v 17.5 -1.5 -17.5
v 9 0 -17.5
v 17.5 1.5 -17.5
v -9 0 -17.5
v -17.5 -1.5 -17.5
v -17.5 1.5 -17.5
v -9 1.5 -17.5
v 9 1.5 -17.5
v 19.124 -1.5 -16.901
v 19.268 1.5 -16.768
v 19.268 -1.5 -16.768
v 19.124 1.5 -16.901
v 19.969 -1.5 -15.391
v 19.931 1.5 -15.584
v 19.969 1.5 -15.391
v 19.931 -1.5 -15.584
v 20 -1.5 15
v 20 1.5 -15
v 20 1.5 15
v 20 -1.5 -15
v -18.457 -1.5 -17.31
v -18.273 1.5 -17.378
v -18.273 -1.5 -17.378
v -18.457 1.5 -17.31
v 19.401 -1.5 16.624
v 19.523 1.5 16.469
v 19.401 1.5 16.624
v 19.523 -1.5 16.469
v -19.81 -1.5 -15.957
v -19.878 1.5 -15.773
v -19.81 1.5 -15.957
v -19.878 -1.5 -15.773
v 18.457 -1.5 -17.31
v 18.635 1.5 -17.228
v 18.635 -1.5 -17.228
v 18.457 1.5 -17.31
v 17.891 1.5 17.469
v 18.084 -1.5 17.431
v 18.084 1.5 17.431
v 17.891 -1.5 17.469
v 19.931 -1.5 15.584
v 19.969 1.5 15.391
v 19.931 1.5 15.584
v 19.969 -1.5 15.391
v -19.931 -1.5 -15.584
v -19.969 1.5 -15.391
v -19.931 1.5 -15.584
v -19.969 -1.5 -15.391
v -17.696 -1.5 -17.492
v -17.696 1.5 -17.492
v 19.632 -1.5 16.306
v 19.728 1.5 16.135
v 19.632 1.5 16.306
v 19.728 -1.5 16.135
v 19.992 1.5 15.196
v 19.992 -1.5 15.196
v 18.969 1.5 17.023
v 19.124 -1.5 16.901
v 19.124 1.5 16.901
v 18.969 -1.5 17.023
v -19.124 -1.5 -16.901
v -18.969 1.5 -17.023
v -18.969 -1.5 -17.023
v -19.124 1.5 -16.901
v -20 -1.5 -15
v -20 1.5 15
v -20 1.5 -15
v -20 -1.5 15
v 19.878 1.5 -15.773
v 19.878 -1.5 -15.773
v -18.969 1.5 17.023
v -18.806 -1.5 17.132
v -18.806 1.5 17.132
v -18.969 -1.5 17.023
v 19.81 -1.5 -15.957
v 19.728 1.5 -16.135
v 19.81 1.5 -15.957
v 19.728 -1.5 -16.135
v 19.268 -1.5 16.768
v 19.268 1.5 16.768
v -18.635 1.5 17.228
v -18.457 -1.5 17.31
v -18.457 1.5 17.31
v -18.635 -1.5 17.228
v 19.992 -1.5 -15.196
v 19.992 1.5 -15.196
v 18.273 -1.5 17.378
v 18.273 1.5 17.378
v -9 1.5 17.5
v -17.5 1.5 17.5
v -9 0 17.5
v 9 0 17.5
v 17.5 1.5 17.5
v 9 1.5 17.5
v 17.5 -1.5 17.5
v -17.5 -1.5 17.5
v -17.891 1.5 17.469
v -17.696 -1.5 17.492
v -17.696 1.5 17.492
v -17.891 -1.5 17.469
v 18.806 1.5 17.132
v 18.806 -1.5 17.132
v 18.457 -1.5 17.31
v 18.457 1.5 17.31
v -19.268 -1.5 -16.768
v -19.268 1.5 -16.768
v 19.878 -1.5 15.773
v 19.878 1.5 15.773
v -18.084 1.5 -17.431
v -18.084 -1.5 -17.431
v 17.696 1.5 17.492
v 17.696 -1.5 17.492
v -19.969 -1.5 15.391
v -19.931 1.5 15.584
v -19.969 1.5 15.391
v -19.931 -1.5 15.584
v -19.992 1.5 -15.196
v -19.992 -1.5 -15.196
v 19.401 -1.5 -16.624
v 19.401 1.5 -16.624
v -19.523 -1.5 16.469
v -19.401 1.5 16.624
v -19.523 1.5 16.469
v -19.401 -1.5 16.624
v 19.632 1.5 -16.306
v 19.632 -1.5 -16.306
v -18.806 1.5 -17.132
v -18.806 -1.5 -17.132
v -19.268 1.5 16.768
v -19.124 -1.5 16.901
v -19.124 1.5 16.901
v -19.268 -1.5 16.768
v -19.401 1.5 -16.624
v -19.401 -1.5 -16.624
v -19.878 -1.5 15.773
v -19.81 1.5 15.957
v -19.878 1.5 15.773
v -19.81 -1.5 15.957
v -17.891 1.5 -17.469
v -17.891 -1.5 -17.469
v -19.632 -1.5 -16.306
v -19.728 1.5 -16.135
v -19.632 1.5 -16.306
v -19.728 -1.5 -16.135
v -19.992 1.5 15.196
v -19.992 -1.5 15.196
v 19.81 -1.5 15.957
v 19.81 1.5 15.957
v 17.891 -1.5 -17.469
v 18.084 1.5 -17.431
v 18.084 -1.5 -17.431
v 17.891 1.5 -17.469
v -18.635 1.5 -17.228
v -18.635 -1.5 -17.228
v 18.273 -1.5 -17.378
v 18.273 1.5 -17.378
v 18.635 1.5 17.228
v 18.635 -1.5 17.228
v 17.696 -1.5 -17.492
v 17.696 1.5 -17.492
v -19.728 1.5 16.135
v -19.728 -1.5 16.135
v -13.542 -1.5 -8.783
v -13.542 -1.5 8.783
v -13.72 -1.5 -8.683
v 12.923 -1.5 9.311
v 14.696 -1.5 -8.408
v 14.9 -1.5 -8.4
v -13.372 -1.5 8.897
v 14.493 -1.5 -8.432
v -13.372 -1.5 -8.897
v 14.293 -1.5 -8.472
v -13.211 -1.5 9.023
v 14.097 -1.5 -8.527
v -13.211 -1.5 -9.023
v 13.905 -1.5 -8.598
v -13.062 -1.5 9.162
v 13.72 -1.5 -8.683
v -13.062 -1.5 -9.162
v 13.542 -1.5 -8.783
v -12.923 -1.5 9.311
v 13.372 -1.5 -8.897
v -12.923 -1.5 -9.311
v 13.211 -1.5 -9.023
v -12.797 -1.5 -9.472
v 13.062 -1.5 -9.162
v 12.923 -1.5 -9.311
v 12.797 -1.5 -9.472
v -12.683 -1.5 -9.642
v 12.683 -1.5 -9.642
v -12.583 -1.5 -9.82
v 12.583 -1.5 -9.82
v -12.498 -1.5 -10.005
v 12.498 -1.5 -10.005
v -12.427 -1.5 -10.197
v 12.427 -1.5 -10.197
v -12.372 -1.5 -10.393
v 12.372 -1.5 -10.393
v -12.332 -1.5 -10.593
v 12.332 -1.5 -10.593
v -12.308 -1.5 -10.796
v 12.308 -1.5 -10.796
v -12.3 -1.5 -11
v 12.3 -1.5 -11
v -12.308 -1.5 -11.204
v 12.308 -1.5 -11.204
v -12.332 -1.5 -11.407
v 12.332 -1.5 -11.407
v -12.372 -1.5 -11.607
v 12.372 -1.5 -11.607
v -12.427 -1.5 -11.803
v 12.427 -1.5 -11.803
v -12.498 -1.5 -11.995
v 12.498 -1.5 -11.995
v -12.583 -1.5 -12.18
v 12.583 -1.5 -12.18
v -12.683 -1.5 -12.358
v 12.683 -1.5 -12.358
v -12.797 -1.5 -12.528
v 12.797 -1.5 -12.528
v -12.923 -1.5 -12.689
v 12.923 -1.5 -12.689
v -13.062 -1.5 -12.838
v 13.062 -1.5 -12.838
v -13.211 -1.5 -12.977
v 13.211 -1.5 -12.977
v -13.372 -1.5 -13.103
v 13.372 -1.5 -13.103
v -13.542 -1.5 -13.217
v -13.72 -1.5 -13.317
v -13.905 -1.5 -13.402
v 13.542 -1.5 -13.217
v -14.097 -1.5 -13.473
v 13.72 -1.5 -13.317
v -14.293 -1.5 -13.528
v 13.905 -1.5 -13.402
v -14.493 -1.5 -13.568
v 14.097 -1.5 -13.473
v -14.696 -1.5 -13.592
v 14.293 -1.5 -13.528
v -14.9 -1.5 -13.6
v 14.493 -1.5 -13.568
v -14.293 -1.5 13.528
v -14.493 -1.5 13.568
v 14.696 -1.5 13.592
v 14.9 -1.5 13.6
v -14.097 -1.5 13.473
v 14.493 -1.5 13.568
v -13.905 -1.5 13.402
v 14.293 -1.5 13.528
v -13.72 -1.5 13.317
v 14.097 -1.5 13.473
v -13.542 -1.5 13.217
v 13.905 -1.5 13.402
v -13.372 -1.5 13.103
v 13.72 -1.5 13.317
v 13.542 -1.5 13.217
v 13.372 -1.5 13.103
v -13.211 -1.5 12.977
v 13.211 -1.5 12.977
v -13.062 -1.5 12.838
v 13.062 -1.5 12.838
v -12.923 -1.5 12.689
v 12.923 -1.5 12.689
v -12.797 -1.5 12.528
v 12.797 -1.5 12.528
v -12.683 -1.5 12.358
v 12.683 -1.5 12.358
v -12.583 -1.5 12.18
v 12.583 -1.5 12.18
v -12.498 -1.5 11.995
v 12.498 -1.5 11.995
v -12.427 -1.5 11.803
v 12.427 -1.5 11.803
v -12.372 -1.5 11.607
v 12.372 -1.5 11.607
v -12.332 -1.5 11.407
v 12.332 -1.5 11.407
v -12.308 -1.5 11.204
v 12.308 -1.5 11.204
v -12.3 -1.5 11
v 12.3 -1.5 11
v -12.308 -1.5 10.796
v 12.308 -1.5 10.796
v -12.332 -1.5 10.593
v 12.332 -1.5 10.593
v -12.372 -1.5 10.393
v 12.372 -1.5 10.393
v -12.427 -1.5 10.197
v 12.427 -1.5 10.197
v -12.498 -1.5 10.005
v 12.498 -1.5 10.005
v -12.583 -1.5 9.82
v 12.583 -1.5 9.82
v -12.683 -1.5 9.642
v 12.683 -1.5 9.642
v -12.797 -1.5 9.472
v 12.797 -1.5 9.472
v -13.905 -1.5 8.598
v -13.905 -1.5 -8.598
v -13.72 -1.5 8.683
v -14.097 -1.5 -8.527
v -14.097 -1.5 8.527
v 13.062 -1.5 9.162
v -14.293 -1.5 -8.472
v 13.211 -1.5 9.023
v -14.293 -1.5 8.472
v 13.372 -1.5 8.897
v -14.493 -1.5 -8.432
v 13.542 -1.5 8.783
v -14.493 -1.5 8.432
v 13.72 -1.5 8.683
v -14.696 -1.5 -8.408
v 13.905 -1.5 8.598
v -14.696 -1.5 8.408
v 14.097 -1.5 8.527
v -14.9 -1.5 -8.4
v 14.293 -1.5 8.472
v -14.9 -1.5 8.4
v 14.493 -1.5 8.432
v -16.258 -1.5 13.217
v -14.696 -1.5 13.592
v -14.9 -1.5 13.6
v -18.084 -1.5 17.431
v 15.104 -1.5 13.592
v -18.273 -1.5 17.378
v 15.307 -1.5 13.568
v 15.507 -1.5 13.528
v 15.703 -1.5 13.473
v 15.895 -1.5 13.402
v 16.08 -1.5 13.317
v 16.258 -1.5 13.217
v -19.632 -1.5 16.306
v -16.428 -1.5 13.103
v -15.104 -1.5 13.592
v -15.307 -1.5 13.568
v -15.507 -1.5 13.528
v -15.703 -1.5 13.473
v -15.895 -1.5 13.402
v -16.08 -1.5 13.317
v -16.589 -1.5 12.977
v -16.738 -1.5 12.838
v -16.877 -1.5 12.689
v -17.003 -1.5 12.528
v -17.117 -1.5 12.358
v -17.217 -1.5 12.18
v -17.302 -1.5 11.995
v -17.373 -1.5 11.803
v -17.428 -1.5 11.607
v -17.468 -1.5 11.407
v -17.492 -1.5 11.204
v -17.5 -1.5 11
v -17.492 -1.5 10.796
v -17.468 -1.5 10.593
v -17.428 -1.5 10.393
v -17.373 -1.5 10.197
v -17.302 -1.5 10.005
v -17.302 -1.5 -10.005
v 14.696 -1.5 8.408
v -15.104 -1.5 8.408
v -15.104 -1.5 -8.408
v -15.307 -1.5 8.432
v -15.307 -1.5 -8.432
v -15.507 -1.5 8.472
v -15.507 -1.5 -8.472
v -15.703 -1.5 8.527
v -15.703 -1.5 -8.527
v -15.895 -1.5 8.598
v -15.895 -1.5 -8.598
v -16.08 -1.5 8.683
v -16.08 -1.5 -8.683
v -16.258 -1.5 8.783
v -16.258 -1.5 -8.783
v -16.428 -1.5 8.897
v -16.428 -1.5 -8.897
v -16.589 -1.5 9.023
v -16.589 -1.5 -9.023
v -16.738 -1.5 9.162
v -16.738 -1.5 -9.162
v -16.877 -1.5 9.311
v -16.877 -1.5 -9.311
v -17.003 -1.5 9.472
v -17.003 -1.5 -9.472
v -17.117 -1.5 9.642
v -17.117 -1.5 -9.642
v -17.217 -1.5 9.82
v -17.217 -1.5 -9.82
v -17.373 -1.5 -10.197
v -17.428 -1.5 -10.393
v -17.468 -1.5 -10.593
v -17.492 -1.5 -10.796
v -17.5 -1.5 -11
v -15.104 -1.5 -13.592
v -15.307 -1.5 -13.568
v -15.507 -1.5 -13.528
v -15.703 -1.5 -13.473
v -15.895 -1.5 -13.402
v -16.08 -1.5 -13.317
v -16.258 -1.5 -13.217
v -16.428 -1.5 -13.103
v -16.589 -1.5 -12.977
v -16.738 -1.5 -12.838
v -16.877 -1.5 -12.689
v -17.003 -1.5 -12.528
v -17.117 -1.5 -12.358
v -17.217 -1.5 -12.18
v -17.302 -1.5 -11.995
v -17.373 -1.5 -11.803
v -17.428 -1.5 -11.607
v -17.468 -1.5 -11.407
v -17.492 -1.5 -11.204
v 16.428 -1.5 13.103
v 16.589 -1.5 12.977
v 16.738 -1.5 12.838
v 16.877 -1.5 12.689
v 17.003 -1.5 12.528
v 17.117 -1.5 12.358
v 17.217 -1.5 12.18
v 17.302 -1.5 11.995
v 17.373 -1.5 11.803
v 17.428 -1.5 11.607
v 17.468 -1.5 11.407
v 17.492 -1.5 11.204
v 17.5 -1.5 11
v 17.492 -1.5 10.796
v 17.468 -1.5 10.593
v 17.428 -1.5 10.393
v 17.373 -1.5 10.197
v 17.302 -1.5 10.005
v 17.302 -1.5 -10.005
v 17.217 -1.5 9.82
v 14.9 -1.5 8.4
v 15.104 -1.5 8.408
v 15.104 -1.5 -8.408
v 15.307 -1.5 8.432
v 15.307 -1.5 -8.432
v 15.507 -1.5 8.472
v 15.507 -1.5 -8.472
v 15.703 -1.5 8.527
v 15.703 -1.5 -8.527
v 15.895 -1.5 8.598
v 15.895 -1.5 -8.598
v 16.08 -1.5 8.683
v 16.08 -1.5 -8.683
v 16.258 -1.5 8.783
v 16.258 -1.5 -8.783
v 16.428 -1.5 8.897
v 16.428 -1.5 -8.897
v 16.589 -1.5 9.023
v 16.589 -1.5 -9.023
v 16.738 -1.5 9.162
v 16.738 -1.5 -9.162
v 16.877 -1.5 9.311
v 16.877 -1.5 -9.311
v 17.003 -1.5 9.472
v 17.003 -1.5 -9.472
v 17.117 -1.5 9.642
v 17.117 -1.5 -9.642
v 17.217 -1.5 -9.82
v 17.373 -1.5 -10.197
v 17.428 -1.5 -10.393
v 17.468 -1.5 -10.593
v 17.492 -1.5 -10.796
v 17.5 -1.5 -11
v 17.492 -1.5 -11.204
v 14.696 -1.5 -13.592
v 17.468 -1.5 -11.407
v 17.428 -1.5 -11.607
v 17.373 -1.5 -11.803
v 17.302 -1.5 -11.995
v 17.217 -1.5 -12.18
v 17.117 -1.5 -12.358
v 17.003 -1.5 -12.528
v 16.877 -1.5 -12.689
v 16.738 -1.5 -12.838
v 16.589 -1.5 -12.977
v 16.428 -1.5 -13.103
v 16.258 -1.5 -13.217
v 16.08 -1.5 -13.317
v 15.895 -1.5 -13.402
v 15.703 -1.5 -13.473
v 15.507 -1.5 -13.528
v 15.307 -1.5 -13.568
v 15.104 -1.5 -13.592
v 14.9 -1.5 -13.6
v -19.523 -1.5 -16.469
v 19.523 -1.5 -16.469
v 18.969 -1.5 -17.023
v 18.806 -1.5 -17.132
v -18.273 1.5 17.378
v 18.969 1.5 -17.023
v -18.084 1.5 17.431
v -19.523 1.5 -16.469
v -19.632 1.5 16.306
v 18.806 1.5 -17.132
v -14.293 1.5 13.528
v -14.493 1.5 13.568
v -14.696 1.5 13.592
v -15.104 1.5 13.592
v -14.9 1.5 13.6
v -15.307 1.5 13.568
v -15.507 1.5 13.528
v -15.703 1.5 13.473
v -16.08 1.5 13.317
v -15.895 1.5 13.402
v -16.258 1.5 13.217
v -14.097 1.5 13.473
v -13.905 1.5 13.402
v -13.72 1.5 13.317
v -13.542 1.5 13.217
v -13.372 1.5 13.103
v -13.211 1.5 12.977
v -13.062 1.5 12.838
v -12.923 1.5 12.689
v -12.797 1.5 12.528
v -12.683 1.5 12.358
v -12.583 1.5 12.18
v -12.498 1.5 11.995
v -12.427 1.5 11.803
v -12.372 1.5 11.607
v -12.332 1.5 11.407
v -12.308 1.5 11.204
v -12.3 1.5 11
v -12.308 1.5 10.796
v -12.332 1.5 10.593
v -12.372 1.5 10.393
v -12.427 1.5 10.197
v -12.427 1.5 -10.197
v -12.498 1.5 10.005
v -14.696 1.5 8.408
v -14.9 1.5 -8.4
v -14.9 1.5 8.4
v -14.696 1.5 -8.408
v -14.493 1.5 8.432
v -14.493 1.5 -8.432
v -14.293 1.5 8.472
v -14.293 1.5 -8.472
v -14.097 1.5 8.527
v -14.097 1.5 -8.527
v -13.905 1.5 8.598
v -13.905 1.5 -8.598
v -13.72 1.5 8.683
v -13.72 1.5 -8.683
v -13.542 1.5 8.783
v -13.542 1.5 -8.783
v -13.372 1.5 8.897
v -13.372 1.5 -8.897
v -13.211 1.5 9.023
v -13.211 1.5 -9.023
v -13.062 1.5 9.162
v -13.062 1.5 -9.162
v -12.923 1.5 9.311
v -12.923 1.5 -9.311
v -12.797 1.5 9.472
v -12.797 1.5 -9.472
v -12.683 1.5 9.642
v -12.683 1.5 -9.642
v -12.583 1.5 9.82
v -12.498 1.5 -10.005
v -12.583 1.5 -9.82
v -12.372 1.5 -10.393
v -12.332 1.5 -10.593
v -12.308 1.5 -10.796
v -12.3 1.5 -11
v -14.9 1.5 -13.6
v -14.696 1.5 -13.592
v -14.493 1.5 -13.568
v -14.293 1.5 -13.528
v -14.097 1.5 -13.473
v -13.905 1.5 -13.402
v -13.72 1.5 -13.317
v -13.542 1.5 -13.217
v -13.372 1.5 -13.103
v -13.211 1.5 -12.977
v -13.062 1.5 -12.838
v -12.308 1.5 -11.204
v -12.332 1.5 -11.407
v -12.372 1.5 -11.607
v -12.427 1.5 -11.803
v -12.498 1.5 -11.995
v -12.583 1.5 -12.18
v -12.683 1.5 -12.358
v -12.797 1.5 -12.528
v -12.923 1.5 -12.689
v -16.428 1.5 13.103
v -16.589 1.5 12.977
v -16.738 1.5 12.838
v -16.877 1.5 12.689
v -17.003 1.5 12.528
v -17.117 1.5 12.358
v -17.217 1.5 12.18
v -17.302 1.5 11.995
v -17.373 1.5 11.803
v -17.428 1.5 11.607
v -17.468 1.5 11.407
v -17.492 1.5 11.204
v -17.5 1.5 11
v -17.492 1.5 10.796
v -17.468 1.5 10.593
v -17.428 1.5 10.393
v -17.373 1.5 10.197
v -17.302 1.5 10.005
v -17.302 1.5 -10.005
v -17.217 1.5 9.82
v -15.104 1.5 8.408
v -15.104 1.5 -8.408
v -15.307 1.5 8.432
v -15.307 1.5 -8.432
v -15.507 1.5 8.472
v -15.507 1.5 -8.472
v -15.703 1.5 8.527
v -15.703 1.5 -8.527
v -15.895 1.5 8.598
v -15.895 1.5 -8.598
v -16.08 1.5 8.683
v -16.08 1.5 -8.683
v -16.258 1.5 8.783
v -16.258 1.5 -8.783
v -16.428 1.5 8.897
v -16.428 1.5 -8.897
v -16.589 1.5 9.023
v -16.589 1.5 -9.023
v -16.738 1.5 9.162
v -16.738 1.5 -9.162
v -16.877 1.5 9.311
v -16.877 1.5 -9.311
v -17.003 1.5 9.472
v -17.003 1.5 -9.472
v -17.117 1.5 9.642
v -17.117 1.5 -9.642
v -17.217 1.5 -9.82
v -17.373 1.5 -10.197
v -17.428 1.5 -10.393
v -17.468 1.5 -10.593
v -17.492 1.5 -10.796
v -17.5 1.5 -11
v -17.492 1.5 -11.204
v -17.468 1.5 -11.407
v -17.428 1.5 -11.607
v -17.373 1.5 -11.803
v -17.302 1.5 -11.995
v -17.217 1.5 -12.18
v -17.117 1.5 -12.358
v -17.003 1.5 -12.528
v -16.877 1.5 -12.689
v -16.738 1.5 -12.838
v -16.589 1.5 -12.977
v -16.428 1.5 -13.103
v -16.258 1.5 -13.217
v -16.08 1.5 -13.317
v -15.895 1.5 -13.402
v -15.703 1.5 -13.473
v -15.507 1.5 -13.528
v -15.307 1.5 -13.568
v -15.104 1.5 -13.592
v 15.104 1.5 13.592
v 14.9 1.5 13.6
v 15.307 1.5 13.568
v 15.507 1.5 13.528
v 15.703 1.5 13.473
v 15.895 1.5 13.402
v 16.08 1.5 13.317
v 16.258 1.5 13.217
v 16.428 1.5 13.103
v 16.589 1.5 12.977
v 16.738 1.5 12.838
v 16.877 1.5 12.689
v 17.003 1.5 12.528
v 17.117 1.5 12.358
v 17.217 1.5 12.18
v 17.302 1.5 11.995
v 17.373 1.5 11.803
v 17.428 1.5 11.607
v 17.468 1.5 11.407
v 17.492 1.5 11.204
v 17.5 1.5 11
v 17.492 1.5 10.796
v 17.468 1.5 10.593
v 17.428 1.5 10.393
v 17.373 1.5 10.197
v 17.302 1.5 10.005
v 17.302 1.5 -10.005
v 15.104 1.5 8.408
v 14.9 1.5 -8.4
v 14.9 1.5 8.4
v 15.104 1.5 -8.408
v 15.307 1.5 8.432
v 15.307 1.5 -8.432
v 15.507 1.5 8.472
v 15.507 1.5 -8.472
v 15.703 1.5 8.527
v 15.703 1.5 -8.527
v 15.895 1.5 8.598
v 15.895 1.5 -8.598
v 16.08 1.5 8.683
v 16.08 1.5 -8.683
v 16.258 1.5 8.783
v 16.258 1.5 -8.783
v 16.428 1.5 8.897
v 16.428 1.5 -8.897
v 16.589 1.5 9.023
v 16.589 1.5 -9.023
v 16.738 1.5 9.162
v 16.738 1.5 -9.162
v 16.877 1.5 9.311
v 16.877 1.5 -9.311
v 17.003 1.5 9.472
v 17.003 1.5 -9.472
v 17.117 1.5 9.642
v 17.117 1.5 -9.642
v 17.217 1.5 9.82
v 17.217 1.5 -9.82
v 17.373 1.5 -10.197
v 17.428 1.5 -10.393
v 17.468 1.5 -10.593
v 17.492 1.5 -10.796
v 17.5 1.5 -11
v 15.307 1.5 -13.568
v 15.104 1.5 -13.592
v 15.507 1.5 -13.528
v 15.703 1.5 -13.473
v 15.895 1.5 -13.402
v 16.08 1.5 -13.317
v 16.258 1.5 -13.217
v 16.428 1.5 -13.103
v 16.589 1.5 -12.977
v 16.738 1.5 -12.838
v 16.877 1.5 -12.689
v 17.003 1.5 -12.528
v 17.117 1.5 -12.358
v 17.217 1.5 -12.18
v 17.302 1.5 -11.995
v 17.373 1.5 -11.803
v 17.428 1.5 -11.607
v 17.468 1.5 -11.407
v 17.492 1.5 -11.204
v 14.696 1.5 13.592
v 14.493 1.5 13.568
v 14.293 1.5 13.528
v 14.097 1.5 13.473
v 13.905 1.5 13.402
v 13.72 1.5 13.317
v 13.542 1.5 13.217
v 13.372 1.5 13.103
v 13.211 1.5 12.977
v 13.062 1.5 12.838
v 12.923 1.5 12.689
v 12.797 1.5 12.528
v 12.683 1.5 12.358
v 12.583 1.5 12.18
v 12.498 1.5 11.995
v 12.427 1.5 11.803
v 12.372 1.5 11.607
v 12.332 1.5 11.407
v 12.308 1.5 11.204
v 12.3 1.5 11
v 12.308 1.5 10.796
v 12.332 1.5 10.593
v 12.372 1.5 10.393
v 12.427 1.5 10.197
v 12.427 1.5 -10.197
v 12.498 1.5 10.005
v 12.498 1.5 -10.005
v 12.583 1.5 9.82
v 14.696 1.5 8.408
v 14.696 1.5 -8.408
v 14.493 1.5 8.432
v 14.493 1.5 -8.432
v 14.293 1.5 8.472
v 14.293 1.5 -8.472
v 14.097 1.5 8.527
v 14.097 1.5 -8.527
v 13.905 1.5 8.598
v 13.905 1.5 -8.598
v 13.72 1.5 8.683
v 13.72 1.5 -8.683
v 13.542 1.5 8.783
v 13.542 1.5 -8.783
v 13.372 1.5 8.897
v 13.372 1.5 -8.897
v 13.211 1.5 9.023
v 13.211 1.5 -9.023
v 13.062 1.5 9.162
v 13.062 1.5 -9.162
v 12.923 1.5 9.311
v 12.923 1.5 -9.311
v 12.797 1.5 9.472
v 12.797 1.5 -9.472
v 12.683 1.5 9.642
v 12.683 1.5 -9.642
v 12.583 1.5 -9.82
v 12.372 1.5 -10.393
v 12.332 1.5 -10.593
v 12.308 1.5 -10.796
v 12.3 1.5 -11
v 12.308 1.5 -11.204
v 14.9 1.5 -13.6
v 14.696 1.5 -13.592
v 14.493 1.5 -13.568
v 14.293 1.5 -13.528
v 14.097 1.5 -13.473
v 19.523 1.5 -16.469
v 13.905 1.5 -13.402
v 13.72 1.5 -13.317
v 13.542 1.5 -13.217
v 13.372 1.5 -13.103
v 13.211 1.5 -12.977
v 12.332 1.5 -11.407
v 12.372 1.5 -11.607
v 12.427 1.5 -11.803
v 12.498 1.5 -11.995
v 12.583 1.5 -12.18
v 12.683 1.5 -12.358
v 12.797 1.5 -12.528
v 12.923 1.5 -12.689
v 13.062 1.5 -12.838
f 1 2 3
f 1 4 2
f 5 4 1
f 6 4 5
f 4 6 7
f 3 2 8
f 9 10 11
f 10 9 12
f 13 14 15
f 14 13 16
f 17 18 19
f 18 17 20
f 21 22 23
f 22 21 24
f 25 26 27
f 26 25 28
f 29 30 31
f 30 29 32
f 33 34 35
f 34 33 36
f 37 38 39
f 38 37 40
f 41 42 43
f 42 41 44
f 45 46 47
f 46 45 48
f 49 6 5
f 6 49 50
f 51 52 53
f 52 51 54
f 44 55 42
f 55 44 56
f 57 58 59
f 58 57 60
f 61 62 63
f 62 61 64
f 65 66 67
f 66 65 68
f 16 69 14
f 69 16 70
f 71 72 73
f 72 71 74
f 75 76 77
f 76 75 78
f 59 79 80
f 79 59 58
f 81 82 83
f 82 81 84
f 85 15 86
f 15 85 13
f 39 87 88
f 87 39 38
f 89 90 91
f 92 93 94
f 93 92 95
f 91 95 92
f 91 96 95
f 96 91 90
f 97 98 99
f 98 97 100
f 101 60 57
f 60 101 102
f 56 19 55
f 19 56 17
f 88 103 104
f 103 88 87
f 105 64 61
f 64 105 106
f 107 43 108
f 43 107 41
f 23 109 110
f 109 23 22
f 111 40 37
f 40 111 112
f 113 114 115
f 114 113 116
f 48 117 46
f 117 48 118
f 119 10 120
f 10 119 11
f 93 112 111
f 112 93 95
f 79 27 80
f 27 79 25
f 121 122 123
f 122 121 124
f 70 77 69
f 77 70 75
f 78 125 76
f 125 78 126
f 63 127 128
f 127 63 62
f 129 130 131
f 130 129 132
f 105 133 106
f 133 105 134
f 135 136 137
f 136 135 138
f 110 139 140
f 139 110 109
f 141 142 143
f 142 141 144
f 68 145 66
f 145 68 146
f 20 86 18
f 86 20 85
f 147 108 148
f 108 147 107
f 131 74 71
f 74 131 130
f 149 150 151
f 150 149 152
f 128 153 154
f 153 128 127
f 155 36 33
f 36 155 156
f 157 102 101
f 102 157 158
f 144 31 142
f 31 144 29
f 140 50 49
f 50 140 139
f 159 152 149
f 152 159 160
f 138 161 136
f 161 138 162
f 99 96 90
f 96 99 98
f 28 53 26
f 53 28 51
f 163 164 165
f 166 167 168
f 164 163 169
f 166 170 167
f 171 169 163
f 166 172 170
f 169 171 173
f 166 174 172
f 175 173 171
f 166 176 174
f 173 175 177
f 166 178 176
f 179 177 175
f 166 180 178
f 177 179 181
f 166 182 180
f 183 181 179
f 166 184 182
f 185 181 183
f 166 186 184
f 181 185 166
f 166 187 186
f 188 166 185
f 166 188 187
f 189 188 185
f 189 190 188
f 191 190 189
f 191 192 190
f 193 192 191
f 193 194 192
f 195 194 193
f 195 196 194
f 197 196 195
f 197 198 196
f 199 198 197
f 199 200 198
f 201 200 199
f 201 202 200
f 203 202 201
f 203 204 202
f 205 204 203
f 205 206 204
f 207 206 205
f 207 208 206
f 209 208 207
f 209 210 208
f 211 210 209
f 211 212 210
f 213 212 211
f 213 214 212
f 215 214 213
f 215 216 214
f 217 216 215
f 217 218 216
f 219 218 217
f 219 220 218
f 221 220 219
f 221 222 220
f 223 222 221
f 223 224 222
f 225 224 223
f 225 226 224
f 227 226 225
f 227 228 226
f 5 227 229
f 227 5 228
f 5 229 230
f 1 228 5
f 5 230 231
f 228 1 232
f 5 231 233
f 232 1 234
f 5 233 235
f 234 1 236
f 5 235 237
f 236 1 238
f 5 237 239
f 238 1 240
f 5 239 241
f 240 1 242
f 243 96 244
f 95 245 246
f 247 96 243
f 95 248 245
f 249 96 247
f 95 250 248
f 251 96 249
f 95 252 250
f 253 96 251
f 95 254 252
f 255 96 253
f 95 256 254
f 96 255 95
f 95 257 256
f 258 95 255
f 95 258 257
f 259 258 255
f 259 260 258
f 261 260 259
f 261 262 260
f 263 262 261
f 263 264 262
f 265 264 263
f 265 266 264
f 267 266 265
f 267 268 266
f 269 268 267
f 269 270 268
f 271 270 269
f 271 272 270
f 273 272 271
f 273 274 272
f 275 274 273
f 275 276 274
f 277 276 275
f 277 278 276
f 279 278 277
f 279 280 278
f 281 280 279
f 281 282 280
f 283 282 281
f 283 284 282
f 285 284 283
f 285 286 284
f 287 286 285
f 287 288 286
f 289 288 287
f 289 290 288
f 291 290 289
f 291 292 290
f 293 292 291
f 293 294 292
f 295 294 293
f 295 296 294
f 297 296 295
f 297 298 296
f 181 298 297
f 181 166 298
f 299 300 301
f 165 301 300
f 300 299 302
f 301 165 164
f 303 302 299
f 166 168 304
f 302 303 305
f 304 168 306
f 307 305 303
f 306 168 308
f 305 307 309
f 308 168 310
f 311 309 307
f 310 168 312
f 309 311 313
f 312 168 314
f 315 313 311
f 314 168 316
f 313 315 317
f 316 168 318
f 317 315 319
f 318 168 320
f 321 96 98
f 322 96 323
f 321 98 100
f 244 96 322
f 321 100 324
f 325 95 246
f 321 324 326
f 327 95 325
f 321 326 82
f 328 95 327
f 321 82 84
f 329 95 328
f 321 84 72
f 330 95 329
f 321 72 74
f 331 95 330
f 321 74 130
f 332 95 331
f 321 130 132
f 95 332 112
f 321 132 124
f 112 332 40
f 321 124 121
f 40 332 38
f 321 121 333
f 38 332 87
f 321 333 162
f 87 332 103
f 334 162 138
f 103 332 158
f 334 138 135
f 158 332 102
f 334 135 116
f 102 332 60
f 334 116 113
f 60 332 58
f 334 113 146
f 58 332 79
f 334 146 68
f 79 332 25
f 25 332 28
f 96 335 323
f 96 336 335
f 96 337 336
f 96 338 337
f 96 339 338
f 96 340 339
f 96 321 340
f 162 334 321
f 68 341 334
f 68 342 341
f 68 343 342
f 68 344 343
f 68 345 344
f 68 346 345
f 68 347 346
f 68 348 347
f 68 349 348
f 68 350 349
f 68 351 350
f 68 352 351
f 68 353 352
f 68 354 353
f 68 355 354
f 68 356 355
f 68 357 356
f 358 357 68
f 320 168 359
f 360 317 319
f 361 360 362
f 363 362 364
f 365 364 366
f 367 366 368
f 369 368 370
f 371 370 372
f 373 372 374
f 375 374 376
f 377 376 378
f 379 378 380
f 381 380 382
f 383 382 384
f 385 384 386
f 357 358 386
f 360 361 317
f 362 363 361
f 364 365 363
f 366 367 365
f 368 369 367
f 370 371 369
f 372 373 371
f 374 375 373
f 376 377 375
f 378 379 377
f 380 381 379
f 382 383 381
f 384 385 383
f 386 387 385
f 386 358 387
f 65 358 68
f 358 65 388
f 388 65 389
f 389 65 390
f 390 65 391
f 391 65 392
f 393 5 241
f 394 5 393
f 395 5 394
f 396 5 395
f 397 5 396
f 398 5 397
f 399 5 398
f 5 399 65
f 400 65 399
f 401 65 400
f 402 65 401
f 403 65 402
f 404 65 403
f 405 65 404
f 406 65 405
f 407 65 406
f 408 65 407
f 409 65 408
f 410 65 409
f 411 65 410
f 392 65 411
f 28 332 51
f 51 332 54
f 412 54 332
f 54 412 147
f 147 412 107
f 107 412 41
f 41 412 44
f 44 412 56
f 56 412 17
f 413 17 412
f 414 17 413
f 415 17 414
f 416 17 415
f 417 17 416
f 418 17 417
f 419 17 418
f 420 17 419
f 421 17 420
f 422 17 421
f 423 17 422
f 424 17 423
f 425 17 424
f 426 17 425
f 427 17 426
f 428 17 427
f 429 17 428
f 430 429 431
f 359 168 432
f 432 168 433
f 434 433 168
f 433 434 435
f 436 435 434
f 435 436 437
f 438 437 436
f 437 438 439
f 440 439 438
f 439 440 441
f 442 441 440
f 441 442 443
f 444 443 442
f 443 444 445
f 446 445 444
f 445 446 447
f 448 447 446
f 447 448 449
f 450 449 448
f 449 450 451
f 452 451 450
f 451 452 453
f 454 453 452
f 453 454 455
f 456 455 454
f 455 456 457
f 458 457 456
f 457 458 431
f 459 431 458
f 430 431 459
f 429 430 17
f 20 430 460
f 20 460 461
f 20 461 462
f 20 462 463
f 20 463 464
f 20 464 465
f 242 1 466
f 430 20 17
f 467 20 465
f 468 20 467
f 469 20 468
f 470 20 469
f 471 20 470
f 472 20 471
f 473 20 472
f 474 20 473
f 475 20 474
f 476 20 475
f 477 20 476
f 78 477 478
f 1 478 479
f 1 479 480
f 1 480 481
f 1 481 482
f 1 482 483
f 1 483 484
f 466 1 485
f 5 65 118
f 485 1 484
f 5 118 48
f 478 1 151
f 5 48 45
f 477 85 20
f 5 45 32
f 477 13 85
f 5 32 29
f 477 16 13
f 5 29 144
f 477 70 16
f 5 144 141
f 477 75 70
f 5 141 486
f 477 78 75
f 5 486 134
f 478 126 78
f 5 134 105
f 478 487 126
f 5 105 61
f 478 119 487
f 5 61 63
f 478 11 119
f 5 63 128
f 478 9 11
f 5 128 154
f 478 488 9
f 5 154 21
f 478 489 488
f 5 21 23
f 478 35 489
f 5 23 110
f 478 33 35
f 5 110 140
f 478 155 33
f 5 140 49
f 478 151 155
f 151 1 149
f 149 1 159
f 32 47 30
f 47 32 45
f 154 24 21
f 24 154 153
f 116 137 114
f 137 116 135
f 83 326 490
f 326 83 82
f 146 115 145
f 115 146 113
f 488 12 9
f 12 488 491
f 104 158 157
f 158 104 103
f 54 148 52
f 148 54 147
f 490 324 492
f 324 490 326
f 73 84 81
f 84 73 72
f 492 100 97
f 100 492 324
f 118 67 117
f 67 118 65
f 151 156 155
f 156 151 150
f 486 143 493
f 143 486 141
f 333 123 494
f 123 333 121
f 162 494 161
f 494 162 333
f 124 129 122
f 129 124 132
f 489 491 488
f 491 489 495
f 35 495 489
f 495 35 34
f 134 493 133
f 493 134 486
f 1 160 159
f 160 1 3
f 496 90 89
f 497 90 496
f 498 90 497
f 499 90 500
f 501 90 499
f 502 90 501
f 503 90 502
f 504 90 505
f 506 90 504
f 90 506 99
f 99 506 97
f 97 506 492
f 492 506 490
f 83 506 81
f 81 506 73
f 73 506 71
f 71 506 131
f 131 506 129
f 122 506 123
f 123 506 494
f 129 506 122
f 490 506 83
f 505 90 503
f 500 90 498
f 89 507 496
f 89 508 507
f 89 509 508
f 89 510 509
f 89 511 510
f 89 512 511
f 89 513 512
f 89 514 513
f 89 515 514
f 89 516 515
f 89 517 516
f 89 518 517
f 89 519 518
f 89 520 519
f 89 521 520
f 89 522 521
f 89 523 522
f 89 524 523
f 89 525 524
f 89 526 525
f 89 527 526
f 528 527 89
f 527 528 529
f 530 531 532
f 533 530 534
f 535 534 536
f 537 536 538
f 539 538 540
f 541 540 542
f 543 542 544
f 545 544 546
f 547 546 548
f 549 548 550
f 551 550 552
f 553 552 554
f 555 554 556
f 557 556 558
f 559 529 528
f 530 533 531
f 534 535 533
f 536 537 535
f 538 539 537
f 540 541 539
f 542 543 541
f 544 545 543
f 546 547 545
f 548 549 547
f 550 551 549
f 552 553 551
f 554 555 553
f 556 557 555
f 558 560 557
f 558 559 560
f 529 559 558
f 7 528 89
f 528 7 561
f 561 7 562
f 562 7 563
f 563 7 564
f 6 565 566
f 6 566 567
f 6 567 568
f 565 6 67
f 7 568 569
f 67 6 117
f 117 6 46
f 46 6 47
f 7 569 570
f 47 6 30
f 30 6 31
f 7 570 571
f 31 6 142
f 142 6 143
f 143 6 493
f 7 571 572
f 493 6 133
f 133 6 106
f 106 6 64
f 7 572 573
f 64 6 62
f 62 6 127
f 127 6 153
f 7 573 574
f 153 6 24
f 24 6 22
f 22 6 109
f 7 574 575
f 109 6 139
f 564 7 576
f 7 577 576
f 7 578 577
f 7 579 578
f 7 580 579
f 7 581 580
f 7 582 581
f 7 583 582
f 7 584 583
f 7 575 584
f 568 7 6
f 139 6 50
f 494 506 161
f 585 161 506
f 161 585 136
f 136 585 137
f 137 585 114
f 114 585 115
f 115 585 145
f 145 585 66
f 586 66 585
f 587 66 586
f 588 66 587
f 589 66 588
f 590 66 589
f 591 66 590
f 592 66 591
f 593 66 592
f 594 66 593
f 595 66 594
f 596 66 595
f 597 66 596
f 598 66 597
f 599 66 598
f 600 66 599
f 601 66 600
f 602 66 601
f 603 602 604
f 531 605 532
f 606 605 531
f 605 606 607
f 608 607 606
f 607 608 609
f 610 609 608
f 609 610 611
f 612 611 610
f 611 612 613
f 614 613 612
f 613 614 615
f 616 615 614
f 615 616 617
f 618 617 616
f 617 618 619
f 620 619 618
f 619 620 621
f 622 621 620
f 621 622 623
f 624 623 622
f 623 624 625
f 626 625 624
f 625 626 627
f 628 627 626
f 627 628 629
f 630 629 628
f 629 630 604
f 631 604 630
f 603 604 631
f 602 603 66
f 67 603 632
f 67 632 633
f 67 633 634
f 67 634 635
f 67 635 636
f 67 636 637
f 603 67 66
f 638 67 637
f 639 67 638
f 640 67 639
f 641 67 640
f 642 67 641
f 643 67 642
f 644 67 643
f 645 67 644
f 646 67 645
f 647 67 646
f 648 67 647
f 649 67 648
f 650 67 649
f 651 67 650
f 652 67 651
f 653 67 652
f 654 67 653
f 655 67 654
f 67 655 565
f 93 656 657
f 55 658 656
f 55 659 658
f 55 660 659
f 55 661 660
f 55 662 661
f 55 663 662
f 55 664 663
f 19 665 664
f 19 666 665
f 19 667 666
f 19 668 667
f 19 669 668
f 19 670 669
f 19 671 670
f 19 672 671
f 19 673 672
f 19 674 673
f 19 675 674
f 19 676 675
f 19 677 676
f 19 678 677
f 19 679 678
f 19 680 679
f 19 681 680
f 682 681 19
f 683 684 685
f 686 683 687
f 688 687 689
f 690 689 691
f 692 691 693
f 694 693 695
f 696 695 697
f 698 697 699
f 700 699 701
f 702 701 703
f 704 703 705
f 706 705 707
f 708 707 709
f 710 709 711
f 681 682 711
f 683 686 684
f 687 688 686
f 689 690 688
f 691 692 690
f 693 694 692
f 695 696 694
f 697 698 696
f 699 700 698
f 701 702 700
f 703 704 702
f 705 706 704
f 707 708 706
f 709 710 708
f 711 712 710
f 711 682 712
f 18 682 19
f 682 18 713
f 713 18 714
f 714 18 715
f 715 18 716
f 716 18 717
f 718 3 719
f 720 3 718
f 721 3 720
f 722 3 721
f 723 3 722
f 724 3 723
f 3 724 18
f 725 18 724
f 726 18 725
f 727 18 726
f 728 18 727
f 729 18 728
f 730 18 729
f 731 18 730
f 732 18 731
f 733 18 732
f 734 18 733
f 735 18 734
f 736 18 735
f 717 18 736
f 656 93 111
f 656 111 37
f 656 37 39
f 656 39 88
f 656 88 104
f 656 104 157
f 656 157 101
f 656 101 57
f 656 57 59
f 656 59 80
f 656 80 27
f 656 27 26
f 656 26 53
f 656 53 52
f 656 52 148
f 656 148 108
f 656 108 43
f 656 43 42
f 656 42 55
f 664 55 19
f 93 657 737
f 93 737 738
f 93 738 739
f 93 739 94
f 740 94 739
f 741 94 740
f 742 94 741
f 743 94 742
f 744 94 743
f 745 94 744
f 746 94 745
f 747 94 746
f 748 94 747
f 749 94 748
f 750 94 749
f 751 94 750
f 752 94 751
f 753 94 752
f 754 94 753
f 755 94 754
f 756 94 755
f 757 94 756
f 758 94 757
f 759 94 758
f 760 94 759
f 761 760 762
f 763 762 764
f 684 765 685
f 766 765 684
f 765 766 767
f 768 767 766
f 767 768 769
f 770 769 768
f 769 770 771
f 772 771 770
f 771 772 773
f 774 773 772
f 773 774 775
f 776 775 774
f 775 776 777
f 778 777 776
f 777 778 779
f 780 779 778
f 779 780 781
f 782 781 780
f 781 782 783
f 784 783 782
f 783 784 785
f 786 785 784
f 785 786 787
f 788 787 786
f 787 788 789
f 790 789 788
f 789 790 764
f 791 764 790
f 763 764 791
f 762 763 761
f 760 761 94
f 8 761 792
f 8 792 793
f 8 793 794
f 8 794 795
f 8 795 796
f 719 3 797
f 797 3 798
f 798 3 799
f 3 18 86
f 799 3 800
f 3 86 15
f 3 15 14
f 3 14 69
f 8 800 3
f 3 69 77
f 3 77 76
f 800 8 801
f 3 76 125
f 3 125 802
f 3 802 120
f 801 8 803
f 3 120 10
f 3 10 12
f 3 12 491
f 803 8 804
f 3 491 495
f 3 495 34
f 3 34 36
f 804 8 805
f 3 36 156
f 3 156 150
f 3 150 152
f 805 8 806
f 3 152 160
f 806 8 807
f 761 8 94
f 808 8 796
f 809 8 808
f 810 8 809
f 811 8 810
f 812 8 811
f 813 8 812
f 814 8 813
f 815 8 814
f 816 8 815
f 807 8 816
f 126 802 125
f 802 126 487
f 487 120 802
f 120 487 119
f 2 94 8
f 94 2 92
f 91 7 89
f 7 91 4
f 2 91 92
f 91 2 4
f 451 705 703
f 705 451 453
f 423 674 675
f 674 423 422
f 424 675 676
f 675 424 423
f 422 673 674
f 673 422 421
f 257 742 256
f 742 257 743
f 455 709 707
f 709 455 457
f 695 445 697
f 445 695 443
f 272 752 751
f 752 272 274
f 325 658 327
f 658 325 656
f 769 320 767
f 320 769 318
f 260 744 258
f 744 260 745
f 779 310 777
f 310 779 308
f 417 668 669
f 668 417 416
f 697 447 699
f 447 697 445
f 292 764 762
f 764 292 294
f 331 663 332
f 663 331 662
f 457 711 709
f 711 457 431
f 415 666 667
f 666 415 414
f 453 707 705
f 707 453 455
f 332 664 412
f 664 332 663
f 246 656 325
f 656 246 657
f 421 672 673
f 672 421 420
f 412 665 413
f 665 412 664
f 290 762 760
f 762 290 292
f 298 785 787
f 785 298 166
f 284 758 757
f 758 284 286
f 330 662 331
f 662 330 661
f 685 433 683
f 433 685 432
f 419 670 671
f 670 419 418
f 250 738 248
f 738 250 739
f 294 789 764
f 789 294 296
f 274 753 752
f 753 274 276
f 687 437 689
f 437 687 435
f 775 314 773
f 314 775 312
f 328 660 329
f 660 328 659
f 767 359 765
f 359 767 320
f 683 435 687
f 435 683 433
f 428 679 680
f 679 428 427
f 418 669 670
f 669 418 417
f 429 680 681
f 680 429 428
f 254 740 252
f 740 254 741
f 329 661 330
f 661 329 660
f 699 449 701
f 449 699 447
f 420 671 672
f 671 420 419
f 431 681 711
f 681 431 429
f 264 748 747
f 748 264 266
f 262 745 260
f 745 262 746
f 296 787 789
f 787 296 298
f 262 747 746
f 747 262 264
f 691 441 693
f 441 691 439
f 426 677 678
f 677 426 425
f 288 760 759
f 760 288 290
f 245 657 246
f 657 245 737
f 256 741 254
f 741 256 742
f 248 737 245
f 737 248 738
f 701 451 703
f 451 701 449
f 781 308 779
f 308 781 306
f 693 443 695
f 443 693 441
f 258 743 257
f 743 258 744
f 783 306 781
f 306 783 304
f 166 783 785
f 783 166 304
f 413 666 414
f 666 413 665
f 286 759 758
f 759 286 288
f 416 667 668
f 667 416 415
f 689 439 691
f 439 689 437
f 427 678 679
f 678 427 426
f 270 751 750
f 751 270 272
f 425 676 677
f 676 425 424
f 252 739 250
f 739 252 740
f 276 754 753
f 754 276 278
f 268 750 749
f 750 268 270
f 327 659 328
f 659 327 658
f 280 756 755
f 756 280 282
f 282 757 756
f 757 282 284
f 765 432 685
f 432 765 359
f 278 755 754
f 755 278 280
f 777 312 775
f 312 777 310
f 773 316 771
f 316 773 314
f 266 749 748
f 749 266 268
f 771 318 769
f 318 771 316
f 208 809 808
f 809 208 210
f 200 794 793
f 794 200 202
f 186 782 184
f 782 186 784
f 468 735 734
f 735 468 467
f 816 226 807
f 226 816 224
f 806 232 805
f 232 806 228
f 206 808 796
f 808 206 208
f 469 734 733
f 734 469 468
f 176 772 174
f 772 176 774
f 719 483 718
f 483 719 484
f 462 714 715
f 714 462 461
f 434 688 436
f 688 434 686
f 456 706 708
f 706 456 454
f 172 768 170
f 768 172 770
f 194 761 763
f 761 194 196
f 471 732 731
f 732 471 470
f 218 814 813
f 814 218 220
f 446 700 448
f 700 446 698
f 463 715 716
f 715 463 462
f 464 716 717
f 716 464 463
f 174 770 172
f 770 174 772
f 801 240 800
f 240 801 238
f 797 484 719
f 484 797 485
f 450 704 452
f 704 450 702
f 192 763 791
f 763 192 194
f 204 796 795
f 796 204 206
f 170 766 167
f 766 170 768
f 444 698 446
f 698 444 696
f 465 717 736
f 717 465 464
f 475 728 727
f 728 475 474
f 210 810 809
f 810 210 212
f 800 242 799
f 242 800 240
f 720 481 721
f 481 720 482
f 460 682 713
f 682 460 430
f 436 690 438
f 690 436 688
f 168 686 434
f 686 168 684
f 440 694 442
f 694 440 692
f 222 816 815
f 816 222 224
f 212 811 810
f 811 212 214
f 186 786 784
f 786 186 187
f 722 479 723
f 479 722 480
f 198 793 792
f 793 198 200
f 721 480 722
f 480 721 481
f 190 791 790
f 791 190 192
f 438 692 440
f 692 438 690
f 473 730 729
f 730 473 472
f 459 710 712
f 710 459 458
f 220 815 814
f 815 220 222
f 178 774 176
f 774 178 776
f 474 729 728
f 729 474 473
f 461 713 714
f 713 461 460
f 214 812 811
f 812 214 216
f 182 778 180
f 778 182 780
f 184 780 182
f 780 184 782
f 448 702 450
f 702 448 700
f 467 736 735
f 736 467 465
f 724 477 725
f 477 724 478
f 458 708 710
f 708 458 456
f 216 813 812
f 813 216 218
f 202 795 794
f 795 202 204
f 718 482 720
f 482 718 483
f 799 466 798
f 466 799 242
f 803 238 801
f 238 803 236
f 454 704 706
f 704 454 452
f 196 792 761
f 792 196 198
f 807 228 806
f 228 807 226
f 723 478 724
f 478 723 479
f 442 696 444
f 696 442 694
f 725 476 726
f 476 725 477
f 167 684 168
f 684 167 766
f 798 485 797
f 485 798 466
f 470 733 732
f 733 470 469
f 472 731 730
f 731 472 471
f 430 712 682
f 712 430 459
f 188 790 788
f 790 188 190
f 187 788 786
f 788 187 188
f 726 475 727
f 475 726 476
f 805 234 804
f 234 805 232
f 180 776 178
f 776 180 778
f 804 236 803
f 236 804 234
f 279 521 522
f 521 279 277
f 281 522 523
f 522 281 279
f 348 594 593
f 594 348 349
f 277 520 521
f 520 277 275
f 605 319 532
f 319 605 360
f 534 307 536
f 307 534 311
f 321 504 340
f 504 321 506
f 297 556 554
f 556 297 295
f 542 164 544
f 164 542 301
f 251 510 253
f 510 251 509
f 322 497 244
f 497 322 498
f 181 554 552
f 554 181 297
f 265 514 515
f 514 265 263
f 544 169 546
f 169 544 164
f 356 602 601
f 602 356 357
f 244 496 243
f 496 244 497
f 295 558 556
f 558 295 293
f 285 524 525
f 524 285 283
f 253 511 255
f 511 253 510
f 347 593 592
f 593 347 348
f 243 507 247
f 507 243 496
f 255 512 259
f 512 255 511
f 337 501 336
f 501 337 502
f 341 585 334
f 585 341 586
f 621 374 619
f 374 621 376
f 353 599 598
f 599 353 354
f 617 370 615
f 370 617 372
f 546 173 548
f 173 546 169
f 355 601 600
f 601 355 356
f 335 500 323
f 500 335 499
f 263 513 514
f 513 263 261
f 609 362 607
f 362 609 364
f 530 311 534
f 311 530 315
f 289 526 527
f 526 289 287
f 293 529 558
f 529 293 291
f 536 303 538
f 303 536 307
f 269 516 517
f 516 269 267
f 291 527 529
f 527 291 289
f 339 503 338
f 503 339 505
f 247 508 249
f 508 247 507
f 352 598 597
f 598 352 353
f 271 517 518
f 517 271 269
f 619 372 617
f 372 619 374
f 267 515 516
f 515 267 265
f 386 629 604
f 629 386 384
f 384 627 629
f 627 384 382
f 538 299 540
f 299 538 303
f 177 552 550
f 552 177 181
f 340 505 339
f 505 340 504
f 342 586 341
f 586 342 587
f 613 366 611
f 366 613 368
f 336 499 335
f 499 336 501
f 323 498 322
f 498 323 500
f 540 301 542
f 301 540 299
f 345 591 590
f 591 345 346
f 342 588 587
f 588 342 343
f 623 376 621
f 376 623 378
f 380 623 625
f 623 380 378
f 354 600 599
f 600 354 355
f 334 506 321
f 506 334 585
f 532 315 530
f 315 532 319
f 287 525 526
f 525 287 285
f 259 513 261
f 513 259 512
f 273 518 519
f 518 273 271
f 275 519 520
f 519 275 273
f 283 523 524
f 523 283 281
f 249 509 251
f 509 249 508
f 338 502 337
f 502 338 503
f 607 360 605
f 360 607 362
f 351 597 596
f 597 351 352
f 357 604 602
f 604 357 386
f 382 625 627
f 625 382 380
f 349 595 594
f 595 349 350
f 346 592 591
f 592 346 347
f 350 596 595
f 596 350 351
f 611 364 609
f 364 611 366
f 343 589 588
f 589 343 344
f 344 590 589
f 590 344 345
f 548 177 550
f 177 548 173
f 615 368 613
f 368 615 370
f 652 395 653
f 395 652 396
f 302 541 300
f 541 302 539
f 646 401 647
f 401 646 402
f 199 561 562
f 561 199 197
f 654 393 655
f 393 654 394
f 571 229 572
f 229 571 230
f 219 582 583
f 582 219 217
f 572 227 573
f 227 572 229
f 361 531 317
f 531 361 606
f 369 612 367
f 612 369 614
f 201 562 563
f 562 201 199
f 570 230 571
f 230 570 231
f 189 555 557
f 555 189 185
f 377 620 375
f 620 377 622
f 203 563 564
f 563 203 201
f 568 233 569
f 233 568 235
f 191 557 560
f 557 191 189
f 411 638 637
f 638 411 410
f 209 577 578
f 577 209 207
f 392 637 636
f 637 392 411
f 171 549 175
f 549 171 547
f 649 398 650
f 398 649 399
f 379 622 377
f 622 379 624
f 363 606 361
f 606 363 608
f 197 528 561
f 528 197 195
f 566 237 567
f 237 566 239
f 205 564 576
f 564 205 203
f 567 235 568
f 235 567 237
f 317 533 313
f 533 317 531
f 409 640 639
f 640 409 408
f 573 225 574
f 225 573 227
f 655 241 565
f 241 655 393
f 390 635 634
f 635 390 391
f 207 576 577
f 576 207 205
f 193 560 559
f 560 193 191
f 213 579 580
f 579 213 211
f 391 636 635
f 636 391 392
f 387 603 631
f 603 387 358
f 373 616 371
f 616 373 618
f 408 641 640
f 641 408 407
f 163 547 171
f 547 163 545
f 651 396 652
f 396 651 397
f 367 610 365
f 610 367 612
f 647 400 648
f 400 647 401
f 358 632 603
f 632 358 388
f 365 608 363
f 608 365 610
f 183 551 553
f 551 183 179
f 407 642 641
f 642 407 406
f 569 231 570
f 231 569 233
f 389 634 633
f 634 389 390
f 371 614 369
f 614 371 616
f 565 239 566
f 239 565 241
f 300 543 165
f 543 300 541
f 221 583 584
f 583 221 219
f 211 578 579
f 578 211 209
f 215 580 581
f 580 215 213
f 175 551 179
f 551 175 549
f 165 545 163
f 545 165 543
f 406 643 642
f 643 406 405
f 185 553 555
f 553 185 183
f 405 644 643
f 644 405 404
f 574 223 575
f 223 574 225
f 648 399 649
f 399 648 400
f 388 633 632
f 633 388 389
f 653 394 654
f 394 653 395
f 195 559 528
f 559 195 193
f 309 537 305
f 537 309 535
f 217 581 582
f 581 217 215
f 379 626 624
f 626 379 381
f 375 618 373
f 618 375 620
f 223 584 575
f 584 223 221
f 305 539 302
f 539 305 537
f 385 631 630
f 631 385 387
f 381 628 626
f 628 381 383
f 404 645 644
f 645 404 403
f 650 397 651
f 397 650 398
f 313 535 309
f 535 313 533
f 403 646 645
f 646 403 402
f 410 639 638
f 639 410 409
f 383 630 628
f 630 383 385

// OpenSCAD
$fn=80;
power();
module power(){
    //cube([18,3,25],center=true); 
    
    difference(){
        minkowski(){
            cube([35,1.5,30],center=true);
            rotate([90,0,0]) cylinder(d=5,h=1.5,center=true);
            //cylinder(d=5,h=1,center=true);
        }
        translate([0,1,0]) cube([18,2,40],center=true);
        
        translate([14.9,0,11]) rotate([90,0,0]) cylinder(d=5.2,h=10,center=true);
        translate([14.9,0,-11]) rotate([90,0,0]) cylinder(d=5.2,h=10,center=true);
        translate([-14.9,0,11]) rotate([90,0,0]) cylinder(d=5.2,h=10,center=true);
        translate([-14.9,0,-11]) rotate([90,0,0]) cylinder(d=5.2,h=10,center=true);
        
    }
    
}
